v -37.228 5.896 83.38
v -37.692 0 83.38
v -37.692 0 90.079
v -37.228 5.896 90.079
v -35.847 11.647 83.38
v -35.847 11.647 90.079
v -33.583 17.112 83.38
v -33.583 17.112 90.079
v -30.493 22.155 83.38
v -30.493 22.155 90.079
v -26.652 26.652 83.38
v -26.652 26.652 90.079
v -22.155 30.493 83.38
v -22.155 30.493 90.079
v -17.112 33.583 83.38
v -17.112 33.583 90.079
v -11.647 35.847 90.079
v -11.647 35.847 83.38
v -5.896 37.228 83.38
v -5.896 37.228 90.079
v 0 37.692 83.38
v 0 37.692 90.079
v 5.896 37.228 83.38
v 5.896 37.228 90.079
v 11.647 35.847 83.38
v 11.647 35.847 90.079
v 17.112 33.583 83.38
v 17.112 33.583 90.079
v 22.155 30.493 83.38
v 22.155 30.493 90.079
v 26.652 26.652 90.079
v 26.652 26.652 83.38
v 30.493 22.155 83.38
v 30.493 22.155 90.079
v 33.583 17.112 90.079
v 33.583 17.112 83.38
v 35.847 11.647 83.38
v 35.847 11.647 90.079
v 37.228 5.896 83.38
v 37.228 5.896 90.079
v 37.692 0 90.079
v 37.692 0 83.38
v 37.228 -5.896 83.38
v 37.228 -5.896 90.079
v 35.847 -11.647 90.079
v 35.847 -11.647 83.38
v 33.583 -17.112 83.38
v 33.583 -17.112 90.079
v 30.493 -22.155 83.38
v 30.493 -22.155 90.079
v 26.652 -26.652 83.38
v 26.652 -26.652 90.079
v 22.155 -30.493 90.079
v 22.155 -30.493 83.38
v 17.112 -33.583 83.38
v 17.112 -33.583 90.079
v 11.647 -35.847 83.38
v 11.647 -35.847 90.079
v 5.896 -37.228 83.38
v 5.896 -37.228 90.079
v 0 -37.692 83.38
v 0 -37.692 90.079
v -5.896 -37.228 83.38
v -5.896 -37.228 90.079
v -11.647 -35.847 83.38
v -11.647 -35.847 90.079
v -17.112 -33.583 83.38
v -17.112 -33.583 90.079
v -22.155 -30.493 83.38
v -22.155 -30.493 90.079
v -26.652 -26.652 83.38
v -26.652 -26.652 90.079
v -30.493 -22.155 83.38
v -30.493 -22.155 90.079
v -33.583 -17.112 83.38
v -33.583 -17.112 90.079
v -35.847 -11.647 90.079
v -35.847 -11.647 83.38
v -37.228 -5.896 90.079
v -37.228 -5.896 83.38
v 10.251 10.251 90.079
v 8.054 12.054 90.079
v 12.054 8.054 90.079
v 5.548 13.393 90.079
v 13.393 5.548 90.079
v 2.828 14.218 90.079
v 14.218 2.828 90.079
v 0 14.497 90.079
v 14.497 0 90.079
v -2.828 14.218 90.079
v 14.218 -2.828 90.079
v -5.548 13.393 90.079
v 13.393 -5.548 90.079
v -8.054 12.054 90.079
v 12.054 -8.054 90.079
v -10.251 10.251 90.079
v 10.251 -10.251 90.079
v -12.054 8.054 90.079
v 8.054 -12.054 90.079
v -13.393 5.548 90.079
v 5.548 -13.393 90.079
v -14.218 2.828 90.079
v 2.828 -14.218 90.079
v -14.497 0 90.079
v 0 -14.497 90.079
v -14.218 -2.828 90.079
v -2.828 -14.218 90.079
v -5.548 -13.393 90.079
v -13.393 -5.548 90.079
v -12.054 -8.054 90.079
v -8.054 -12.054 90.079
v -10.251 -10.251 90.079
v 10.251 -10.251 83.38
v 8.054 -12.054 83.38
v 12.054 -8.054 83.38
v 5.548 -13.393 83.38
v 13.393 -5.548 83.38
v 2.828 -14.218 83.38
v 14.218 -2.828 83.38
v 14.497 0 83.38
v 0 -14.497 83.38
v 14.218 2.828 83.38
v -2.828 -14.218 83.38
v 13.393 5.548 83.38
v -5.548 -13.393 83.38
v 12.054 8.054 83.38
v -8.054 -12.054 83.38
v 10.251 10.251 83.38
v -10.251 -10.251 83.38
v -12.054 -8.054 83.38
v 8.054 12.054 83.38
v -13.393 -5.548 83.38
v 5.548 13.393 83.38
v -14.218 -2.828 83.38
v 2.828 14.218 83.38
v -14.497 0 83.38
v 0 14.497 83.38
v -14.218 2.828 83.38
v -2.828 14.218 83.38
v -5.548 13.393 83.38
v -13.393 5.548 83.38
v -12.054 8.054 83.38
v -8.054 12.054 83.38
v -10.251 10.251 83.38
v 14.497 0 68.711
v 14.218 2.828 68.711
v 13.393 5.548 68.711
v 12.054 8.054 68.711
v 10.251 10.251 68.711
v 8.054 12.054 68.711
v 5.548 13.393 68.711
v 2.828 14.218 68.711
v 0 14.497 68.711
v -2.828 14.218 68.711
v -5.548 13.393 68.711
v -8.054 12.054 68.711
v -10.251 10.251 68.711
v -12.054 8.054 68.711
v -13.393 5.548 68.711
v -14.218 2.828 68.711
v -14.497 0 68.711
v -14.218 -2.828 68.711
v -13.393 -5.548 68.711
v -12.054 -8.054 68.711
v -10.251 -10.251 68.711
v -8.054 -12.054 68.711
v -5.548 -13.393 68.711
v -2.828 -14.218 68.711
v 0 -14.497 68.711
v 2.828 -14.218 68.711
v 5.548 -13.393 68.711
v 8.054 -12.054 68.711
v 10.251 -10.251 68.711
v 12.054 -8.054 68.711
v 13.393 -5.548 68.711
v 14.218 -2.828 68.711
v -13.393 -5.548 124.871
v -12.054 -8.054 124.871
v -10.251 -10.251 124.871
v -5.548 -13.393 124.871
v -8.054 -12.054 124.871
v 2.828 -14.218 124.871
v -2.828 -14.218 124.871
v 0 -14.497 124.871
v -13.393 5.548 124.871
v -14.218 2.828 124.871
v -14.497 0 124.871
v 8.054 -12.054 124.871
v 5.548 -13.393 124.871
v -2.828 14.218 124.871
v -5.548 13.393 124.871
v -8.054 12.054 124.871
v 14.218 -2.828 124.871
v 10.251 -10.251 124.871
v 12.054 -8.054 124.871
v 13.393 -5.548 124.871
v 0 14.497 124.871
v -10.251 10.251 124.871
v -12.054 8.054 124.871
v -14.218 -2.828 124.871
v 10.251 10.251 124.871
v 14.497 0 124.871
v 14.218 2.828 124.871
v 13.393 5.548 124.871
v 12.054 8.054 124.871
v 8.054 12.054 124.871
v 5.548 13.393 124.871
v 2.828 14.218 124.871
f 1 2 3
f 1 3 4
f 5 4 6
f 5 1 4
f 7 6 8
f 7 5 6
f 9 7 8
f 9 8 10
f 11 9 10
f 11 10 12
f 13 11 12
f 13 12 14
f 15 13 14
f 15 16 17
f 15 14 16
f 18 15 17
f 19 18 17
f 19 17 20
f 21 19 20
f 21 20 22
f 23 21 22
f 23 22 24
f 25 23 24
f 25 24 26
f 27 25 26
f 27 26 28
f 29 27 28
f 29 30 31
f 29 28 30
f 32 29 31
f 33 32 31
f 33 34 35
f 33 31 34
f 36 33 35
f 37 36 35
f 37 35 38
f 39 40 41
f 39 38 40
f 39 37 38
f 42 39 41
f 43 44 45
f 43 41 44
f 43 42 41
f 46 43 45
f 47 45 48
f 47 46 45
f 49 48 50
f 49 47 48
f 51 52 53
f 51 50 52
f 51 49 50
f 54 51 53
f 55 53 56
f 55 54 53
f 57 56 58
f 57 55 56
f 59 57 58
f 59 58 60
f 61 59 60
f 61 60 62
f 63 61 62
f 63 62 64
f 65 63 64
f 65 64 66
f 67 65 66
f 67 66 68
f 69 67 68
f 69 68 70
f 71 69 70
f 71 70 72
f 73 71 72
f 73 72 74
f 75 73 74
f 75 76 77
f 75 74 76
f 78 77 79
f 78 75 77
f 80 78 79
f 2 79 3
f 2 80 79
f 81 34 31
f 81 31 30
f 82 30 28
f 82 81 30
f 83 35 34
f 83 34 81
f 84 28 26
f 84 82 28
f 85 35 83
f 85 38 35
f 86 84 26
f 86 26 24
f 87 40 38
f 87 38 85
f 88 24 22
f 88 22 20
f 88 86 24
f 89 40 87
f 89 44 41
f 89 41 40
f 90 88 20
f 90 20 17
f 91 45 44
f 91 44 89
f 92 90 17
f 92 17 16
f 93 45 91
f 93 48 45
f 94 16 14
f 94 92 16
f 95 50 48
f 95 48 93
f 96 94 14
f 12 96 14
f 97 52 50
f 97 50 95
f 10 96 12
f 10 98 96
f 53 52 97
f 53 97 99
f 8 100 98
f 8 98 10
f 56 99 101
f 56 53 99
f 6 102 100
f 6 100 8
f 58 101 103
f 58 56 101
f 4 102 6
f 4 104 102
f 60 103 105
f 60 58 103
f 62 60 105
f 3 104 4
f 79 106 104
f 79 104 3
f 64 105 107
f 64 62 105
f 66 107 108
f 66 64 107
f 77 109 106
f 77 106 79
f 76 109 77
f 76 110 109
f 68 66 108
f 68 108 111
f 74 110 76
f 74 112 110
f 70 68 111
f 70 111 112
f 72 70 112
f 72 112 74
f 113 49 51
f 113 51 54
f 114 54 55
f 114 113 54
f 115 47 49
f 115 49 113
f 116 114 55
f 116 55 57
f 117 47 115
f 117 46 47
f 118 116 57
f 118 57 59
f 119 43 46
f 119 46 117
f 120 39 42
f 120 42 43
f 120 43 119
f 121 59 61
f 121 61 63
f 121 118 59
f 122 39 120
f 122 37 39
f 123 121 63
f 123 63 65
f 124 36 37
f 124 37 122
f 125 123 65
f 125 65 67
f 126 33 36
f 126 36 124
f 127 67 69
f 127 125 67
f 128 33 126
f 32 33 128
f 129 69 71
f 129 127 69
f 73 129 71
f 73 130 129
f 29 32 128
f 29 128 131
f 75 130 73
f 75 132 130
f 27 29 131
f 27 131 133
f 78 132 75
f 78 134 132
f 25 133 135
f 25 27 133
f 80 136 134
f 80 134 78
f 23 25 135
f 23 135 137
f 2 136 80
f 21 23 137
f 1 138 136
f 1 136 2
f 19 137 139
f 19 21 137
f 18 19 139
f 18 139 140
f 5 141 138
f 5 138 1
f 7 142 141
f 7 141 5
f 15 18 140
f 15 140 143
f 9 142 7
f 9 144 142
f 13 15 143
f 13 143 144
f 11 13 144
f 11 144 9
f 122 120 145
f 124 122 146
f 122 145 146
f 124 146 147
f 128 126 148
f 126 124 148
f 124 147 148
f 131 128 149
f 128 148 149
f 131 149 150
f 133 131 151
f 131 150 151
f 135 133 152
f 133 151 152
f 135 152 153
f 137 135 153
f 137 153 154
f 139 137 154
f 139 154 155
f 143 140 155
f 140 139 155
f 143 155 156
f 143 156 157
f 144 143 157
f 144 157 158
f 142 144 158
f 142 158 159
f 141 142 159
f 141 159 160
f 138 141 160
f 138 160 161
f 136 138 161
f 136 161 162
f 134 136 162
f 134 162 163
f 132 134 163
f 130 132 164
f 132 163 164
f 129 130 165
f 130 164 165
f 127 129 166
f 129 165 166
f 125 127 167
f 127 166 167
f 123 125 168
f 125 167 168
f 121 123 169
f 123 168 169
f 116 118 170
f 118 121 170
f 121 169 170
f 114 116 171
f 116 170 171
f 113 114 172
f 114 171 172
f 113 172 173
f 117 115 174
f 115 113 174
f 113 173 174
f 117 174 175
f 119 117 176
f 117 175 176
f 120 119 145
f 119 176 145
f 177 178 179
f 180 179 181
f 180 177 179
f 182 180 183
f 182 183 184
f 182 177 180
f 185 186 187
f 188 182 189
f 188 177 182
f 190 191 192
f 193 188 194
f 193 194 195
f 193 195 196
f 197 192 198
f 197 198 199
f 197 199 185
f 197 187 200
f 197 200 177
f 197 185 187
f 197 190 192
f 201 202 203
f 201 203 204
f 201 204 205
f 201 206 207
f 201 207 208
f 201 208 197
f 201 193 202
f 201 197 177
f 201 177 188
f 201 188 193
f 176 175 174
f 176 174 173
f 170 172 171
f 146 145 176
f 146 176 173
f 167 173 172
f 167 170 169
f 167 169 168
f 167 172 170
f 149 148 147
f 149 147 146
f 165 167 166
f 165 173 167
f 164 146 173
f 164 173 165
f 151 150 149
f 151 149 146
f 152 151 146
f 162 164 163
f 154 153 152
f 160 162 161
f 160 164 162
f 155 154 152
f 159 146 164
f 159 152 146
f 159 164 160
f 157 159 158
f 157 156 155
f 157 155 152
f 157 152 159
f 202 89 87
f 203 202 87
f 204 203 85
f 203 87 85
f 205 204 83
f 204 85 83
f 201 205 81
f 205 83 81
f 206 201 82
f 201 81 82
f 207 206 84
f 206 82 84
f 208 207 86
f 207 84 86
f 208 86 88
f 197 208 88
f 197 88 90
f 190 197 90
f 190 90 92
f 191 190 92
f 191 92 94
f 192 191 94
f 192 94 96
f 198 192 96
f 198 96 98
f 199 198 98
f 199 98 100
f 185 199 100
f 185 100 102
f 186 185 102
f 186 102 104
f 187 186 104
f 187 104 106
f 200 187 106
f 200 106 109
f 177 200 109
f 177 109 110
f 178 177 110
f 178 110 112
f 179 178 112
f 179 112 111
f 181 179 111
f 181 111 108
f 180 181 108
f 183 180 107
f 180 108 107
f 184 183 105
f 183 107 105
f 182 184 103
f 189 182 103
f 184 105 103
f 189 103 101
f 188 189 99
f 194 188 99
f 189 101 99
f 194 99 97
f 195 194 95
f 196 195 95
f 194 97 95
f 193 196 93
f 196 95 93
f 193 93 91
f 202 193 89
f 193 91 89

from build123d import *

# Parameters (mm, degrees)
SKETCH1_R           = 5
BOSS_EXTRUDE1_DEPTH = 80
SCALE1_SCALE        = 1.9329
BOSS_EXTRUDE2_START = 0.6
SKETCH3_R           = 25.1277
BOSS_EXTRUDE2_DEPTH = 0.6
SCALE2_SCALE        = 1.5


with BuildPart() as part:
    # Sketch1 → Boss-Extrude1 (new body)
    with BuildSketch(Plane.XY):
        Circle(SKETCH1_R)
    extrude(amount=BOSS_EXTRUDE1_DEPTH)

    # Sketch2 → Revolve1 (revolve)
    with BuildSketch(Plane(origin=(0, 0, 0), x_dir=(1, 0, 0), z_dir=(0, 1, 0))):
        Polygon((0, -66), (0, -68), (-5, -68), (-13, -68), (-13, -66), align=None)
    revolve(axis=Axis((0, 0, 66), (0, 0, 1)))


with BuildPart() as part_1:
    # Scale1: scaled about (0, 0, 43.398601399)
    add(part.part.scale(SCALE1_SCALE).moved(Location((0, 0, -40.486555245))))

    # Sketch3 → Boss-Extrude2 (add)
    with BuildSketch(Plane(origin=(0, 0, 87.084844755), x_dir=(-1, 0, 0), z_dir=(0, 0, -1)).offset(BOSS_EXTRUDE2_START)):
        Circle(SKETCH3_R)
    extrude(amount=-BOSS_EXTRUDE2_DEPTH)

    # Sketch4 → Cut-Revolve1 (revolve, cut)
    with BuildSketch(Plane(origin=(0, 0, 0), x_dir=(0, 0, -1), z_dir=(1, 0, 0)), mode=Mode.PRIVATE) as cut_revolve1_sk:
        Polygon((-76.705174755, 26.6900619), (-76.705174755, 0), (46.736883237, 0), (46.736883237, 27.883866585), align=None)
    revolve(cut_revolve1_sk.sketch.rotate(Axis((0, 0, 76.705174755), (0, 0, -1)), 270), axis=Axis((0, 0, 76.705174755), (0, 0, -1)), mode=Mode.SUBTRACT)


with BuildPart() as part_2:
    # Scale2: scaled about (0, 0, 92.693679073)
    add(part_1.part.scale(SCALE2_SCALE).moved(Location((0, 0, -46.346839536))))


solid = part_2.part
